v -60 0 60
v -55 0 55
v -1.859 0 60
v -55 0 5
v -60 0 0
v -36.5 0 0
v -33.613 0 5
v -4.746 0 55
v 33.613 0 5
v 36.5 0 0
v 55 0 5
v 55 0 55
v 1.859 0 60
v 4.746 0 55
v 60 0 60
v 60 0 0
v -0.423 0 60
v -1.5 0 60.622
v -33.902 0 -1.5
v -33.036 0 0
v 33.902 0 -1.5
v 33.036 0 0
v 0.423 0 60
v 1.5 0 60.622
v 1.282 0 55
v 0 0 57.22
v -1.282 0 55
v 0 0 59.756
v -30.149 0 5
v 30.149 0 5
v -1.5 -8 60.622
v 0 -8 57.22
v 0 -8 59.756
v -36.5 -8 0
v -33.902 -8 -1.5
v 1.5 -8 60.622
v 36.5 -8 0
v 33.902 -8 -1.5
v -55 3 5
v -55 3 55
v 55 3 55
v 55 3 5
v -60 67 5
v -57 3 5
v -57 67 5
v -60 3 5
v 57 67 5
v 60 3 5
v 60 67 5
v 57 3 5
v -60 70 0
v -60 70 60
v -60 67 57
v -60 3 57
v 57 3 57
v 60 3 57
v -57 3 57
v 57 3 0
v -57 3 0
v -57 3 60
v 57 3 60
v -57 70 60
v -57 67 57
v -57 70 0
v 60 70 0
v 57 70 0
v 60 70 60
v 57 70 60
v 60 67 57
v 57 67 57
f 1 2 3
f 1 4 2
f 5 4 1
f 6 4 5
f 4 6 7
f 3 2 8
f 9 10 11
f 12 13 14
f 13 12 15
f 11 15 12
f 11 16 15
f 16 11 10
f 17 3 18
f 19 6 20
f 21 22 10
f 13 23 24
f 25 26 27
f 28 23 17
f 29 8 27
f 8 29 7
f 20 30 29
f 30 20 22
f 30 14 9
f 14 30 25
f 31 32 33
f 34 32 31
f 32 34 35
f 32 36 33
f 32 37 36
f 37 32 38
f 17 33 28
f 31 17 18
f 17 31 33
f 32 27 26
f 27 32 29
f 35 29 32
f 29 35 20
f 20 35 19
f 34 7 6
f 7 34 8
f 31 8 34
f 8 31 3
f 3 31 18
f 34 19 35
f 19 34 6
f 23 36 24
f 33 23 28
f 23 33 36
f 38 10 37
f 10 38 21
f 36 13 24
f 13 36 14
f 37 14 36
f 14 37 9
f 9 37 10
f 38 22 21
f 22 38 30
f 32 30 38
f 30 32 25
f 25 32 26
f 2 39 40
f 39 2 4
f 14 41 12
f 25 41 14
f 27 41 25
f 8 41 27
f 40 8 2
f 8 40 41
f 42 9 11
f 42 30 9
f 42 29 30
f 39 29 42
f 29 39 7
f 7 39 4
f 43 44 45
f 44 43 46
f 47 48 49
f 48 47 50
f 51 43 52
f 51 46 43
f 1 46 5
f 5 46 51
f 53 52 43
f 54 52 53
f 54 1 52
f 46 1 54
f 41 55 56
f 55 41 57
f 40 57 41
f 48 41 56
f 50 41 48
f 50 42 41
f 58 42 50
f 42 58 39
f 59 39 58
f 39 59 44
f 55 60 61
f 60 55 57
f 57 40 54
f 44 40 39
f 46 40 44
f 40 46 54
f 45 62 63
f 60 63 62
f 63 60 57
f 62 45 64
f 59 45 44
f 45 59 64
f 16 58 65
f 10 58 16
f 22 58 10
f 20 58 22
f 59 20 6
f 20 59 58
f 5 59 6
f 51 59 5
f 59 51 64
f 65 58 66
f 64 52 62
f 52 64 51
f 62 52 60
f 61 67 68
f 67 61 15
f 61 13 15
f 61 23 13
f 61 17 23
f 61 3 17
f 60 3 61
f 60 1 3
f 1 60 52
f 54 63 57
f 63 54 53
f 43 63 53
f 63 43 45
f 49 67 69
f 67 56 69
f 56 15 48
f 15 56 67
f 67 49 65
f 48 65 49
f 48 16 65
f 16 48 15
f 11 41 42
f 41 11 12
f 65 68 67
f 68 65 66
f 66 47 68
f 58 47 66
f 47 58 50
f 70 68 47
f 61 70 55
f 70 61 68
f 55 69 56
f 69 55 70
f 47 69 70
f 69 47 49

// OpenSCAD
// file: config.scad
//$fs=$fs/2;
//$fa=$fa/2;

r4 = 2.2;
r8 = 4.2;
r10 = 5.2;

layer_height = 0.25;

switch_d = 9.6;

nema17_r_vis = 15.5;
nema17_r_centre = 11.5;
nema17_h_centre = 2;
nema17_h = 43;
nema17_l = 40;

boite_ui_largeur = 28.5;
boite_ui_l = 46;

support_laser = 24;

r3 = 1.75;
r3_2d = 1.5;
r3_vis = 1.65;
r3_head = 3.6;
m3_r = r3;
m3_nut_d = 7;
m3_nut_d2 = 6.2;
m3_nut_h = 3;

m4_nut_d = 8;
m4_nut_d2 = 7;
m4_nut_h = 4;

608_r = 23/2;
608_h = 8;

laser_printer_l = 609;
laser_printer_lg = 456;


module support_nut(d=3, l_screw1 = 20, l_screw2 = 20, l_nut = 20, h_screw2 = -0.1){
    if(d==3){
        screw_r = r3;
        nut_r = m3_nut_d/2;
        nut_h = m3_nut_h;
        cylinder(nut_h, r = nut_r, $fn = 6, center = true);
        translate([0, 0, -l_screw1])cylinder(l_screw1 +1, r = screw_r);
        translate([0, 0, m3_nut_h/2+ h_screw2])cylinder(l_screw2, r = screw_r);
        l = m3_nut_d*cos(30);
        translate([0, -l/2, -nut_h/2]) cube([l_nut, l,nut_h]);
    } else if(d==4){
        screw_r = r4;
        nut_r = m4_nut_d/2;
        nut_h = m4_nut_h;
        cylinder(nut_h, r = nut_r, $fn = 6, center = true);
        translate([0, 0, -l_screw1])cylinder(l_screw1 +1, r = screw_r);
        translate([0, 0, m4_nut_h/2+ h_screw2])cylinder(l_screw2, r = screw_r);
        l = m4_nut_d*cos(30);
        translate([0, -l/2, -nut_h/2]) cube([l_nut, l,nut_h]);
    }
}


module nut(d=3, center = false){
    nut_r = m3_nut_d/2;
    nut_h = m3_nut_h;
    if(d==3){
        nut_r = m3_nut_d/2;
        nut_h = m3_nut_h;
    } 
    cylinder(nut_h, r = nut_r, $fn = 6, center = center);
}



module m3(h, nut = false, head = false){
    cylinder(h, m3_r, m3_r, $fn=16);
    if(nut){
        cylinder(m3_nut_h, r = m3_nut_d/2, $fn = 6);
    }
}

module m3_nut(h){
    cylinder(m3_nut_h, r = m3_nut_d/2, $fn = 6);
    translate([0, -m3_nut_d2/2, 0]) cube([h, m3_nut_d2, m3_nut_h]);
}

m4_r = 2.3;
m4_nut_d = 8.4;
m4_nut_d2 = 7.5;
m4_nut_h = 3.5;
module m4(h, nut = false, head = false){
    cylinder(h, m4_r, m4_r);
    if(nut){
        cylinder(m4_nut_h, r = m4_nut_d/2, $fn = 6);
    }
}

module m5(h, nut = false, head = false){
    cylinder(h, r = 2.7);
}

m8_nut_d = 15;
m8_nut_d2 = 13;
m8_nut_h = 6.5;
module m8(h, nut = false, head = false){
    cylinder(h, r = r8);
    if(nut){
        cylinder(m8_nut_h, r = m8_nut_d/2, $fn = 6);
    }
}

module cube_arrondi(x, y, z, r=2){
    hull(){
        translate([(x/2-r), (y/2-r), 0]) cylinder(z,r=r);
        translate([(x/2-r), -(y/2-r), 0]) cylinder(z,r=r);
        translate([-(x/2-r), (y/2-r), 0]) cylinder(z,r=r);
        translate([-(x/2-r), -(y/2-r), 0]) cylinder(z,r=r);
    }
}

module demi_glissiere(r, l, h){
    cylinder(h, r, r);
    translate([-r, 0, 0]) cube([r*2, l, h]);
}


module nema17_2d(){
    nema17_l = 43;
    nema17_h = 6;
    polygon([[0,nema17_h], [nema17_h,0]
            , [nema17_l-nema17_h,0],[nema17_l,nema17_h]
            , [nema17_l,nema17_l-nema17_h],[nema17_l-nema17_h,nema17_l]
            , [8,nema17_l],[0,nema17_l-nema17_h] ]);
}

module nema17_2d2(){
    translate([nema17_r_vis, nema17_r_vis] ) circle(r3_2d);
    translate([nema17_r_vis, -nema17_r_vis] ) circle(r3_2d);
    translate([-nema17_r_vis, nema17_r_vis] ) circle(r3_2d);
    translate([-nema17_r_vis, -nema17_r_vis] ) circle(r3_2d);
    circle(nema17_r_centre);
}


module nema17(){
    translate([-nema17_h/2, -nema17_h/2, -nema17_l/2] ) linear_extrude(nema17_l) nema17_2d();
    
    h = nema17_h/2+6;
    translate([nema17_r_vis, nema17_r_vis, 0] )rotate([0, 0, 0]) cylinder(h, r = r3);
    translate([nema17_r_vis, -nema17_r_vis, 0] )rotate([0, 0, 0]) cylinder(h, r = r3);
    translate([-nema17_r_vis, nema17_r_vis, 0] )rotate([0, 0, 0]) cylinder(h, r = r3);
    translate([-nema17_r_vis, -nema17_r_vis, 0] )rotate([0, 0, 0]) cylinder(h, r = r3);
    cylinder(h, nema17_r_centre, nema17_r_centre);
    cylinder(h+14, r = 8);
    
    translate([-8.5, 0, -nema17_l/2] ) cube([17,30, 10]);
}

module corner(l_corner, h_corner, lg_corner){
    translate([0, lg_corner, 0]) rotate([90, 0, 0]) linear_extrude(lg_corner) polygon([[0,0], [l_corner, 0], [0, h_corner]]);
}


/**
 * 2D
 **/

module m3_2d(){
    circle(r3_2d);
}


module cran_x(_l, e, cran, inv){
    difference(){
        square([_l, e]);
        if(inv){
            for(i=[-round(_l/cran):round(_l/cran)]){
                translate([_l/2 + cran/2 - 2*i*cran, -1]) square([cran, e+2]);
            }
        }else{
            for(i=[-round(_l/cran):round(_l/cran)]){
                translate([_l/2 - cran/2 - 2*i*cran, -1]) square([cran, e+2]);
            }
        }
    }
}

module cran_y(_l, e, cran, inv){
    translate([e, 0]) rotate([0, 0, 90]) cran_x(_l, e, cran, inv); 
}

module whole_2d(type_vis){
    if(type_vis == 3){
        circle(1.5);
    } else if(type_vis == 4){
        circle(2);
    } else {
        echo("whole_2d " + type_vis);
    }
}

module nuts_2d(type_vis){
    if(type_vis == 3){
        translate([-1.5, 0])square([3, 20]);
        translate([-5.5/2, 10])square([5.5, 2.5]);
    } else if(type_vis == 4){
        translate([-2, 0])square([4, 30]);
        translate([-7/2, 20])square([7, 3.5]);
    } else {
        echo("nuts_2d " + type_vis);
    }
}

module cran_x_vis(_l, e, cran, type_vis = 3, trous = [0.1, 0.5, 0.9]){
    difference(){
        square([_l, e]);
        for(i=[-round(_l/cran):round(_l/cran)]){
                translate([_l/2 - cran/2 - 2*i*cran, -1]) square([cran, e+2]);
            }
        
    }
    for(i = trous){
        j = round((i-0.5)*_l/(2*cran));
        translate([_l/2  - 2*j*cran, e/2]) whole_2d(type_vis);
    }
}

module cran_x_nuts(_l, e, cran, type_vis = 3, trous = [0.1, 0.5, 0.9]){
    difference(){
        square([_l, e]);
        for(i=[-round(_l/cran):round(_l/cran)]){
                translate([_l/2 + cran/2 - 2*i*cran, -1]) square([cran, e+2]);
        }
    }
    for(i = trous){
        j = round((i-0.5)*_l/(2*cran));
        translate([_l/2  - 2*j*cran, e/2]) nuts_2d(type_vis);
    }
}

module cran_y_vis(_l, e, cran, type_vis = 3, trous = [0.1, 0.5, 0.9]){
    translate([e, 0]) rotate([0, 0, 90]) cran_x_vis(_l, e, cran, type_vis, trous);
}

module cran_y_nuts(_l, e, cran, type_vis = 3, trous = [0.1, 0.5, 0.9]){
    translate([0, _l]) rotate([0, 0, -90]) cran_x_nuts(_l, e, cran, type_vis, trous);
}
// main file
include <config.scad>
//$fs=$fs/2;
//$fa=$fa/2;

echelle = 1/10;

e1 = 80*echelle;
e2 = 40*echelle;

poid1 = 2.83;
prix1 = 10;
poid2 = 2.31;
prix2 = 7;

e1 = 50*echelle;
e2 = 30*echelle;

poid1 = 2.31;
prix1 = 8;
poid2 = 1.68;
prix2 = 5;

l = 1200*echelle;
lg = 700*echelle;
h = 600*echelle;

angle = 33;

module triangle_attelage(){
    for(i = [0,1]){
        mirror([i,0,0])translate([-730*echelle/2,-80*echelle,0]) rotate([0,30,0])
        cube([30*echelle, 80*echelle, 700*echelle]);    
    }
}

triangle_attelage();

translate([-l/2, 0,0])cube([l, e2, e1]);
translate([-l/2, 0,h-e1])cube([l, e2, e1]);
for(i = [0,1]){
    mirror([i,0,0]) translate([-l/2, 0,e1]) cube([e1, e2, h-2*e1]);
    mirror([i,0,0]) translate([-l/2, 0,0]) cube([e2, lg, e1]);
    
    mirror([i,0,0]) translate([-l/2, 0,h-e2]) cube([e2, lg, e2]);
    mirror([i,0,0]) translate([-l/2, lg-e2,e1]) cube([e2, e2, h-e1-e2]);
}

poid1=1.67;

echo("cadre 1: ");
temp1 = 2*l/echelle+2*h/echelle;
echo(temp1);
echo("cadre 2:");
temp2 = 2*lg/echelle;
echo(temp2);
temp3 = 2*(lg+h)/echelle;
echo(temp3);
temp4 = 2*(l)/echelle;
echo(temp4);


echo(((temp1+temp2)*poid1+(temp3+temp4)*poid2)/1000, "kg");
echo(((temp1+temp2)*prix1+(temp3+temp4)*prix2)/1000, "euros");
